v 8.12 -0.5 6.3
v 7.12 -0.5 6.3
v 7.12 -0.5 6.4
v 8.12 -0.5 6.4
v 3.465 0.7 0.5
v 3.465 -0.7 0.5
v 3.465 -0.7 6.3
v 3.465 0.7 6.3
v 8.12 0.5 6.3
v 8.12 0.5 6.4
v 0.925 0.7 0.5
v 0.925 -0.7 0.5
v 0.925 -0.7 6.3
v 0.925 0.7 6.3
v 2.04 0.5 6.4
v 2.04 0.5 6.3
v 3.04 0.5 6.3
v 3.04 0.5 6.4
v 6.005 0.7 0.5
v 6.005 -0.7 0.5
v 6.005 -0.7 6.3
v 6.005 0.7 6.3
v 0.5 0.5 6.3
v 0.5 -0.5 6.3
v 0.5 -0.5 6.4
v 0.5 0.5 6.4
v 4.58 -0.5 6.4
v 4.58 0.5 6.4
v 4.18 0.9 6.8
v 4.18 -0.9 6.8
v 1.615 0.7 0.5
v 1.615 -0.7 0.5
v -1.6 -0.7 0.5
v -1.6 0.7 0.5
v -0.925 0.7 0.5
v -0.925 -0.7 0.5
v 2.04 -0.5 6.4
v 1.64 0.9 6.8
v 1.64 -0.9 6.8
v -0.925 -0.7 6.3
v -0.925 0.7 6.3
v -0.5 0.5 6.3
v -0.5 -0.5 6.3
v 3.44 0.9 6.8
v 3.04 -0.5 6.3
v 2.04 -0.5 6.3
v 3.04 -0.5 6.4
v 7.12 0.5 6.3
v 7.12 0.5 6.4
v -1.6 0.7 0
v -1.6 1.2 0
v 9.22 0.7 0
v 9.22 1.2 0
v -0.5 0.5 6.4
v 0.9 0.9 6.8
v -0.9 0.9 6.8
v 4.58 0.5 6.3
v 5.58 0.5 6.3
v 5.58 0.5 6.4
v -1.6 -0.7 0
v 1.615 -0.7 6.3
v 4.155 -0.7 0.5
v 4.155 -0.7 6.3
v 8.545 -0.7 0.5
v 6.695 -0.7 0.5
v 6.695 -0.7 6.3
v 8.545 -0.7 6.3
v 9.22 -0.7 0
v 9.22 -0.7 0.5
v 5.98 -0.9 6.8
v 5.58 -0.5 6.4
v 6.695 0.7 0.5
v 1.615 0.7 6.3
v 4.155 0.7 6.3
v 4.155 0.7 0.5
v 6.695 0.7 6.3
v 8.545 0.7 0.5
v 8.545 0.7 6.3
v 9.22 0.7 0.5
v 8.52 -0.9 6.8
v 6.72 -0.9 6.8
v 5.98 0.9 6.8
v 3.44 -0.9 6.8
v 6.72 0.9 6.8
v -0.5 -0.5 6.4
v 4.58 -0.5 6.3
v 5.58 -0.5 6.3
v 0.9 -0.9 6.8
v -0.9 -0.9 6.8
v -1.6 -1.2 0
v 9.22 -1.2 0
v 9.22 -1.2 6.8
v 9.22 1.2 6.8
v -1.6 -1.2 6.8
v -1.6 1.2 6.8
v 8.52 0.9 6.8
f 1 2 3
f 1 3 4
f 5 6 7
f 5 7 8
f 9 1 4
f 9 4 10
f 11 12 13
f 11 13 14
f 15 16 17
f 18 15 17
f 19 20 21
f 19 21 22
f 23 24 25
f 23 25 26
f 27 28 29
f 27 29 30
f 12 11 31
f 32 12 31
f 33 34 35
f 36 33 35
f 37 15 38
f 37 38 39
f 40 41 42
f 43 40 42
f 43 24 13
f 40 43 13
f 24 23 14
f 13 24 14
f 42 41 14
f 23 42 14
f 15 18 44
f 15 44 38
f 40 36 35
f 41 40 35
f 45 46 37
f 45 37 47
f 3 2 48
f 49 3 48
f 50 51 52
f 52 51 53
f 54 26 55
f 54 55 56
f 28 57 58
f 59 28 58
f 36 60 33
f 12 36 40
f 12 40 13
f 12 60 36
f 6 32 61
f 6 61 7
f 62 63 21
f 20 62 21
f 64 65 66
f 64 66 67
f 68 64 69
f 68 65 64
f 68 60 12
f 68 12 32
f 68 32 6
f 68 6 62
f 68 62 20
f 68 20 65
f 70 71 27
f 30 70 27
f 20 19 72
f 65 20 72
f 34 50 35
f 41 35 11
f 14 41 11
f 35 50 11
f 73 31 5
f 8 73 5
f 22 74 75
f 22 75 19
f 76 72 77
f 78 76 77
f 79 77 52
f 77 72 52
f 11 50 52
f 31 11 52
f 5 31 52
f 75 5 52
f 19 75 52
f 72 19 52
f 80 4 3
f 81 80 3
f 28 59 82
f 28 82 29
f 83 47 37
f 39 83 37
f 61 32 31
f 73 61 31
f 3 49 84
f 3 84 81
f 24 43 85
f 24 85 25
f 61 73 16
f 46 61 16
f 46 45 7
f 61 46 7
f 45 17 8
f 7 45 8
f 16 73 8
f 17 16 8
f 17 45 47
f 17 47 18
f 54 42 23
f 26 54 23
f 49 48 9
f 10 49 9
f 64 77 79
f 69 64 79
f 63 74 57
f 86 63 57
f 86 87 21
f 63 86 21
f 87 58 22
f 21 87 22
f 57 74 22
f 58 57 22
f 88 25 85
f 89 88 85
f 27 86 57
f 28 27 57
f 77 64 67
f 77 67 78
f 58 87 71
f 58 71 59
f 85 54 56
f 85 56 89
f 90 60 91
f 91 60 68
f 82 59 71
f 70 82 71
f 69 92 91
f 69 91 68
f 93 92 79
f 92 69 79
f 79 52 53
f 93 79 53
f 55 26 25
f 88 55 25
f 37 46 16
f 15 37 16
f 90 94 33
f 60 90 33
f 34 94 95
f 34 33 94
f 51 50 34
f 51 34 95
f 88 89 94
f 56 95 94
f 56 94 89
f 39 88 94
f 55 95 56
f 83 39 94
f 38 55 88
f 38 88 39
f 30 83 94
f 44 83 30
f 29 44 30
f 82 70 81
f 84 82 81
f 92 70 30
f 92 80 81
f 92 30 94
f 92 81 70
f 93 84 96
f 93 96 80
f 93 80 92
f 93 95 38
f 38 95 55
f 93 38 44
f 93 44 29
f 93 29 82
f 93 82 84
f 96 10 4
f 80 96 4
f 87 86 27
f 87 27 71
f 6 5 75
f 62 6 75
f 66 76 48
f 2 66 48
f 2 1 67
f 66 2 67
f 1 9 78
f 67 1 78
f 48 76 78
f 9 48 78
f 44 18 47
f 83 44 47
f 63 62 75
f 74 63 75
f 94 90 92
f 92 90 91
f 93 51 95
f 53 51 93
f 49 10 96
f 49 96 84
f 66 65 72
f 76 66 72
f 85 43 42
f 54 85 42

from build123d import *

# Parameters (mm, degrees)
SKETCH007_W      = 1
SKETCH007_H      = 1
EXTRUDE007_DEPTH = 9
SKETCH008_W      = 4
SKETCH008_H      = 1.4
EXTRUDE008_DEPTH = 0.5
SKETCH006_W      = 1.85
SKETCH006_H      = 1.4
EXTRUDE006_DEPTH = 6.3
SKETCH005_W      = 3.2
SKETCH005_H      = 2.4
EXTRUDE005_DEPTH = 6.8
CHAMFER001_SIZE  = 0.4
ARRAY003_X_COUNT = 4
ARRAY003_X_PITCH = 2.54


with BuildPart() as extrude007:
    # Sketch007 → Extrude007 (new body)
    with BuildSketch(Plane.XY):
        Rectangle(SKETCH007_W, SKETCH007_H)
    extrude(amount=EXTRUDE007_DEPTH)


with BuildPart() as extrude008:
    # Sketch008 → Extrude008 (new body)
    with BuildSketch(Plane.XY):
        Rectangle(SKETCH008_W, SKETCH008_H)
    extrude(amount=EXTRUDE008_DEPTH)


with BuildPart() as fusion002:
    # Sketch006 → Extrude006 (new body)
    with BuildSketch(Plane.XY):
        Rectangle(SKETCH006_W, SKETCH006_H)
    extrude(amount=EXTRUDE006_DEPTH)

    # Fusion002: union Extrude007, Extrude008
    add(extrude007.part)
    add(extrude008.part)


with BuildPart() as body001:
    # Sketch005 → Extrude005 (new body)
    with BuildSketch(Plane.XY):
        Rectangle(SKETCH005_W, SKETCH005_H)
    extrude(amount=EXTRUDE005_DEPTH)

    # Cut002: cut Fusion002
    add(fusion002.part, mode=Mode.SUBTRACT)

    # Chamfer001
    chamfer001_edges = [body001.edges().sort_by_distance(p)[0] for p in [
        (0.5, 0, 6.8),
        (0, 0.5, 6.8),
        (-0.5, 0, 6.8),
        (0, -0.5, 6.8),
    ]]
    chamfer(chamfer001_edges, length=CHAMFER001_SIZE)

    # Array003 X: body001 ×4


with BuildPart() as body001_1:
    add(body001.part)
    with Locations(*[(i * ARRAY003_X_PITCH, 0, 0) for i in range(1, ARRAY003_X_COUNT)]):
        add(body001.part)


solid = body001_1.part
